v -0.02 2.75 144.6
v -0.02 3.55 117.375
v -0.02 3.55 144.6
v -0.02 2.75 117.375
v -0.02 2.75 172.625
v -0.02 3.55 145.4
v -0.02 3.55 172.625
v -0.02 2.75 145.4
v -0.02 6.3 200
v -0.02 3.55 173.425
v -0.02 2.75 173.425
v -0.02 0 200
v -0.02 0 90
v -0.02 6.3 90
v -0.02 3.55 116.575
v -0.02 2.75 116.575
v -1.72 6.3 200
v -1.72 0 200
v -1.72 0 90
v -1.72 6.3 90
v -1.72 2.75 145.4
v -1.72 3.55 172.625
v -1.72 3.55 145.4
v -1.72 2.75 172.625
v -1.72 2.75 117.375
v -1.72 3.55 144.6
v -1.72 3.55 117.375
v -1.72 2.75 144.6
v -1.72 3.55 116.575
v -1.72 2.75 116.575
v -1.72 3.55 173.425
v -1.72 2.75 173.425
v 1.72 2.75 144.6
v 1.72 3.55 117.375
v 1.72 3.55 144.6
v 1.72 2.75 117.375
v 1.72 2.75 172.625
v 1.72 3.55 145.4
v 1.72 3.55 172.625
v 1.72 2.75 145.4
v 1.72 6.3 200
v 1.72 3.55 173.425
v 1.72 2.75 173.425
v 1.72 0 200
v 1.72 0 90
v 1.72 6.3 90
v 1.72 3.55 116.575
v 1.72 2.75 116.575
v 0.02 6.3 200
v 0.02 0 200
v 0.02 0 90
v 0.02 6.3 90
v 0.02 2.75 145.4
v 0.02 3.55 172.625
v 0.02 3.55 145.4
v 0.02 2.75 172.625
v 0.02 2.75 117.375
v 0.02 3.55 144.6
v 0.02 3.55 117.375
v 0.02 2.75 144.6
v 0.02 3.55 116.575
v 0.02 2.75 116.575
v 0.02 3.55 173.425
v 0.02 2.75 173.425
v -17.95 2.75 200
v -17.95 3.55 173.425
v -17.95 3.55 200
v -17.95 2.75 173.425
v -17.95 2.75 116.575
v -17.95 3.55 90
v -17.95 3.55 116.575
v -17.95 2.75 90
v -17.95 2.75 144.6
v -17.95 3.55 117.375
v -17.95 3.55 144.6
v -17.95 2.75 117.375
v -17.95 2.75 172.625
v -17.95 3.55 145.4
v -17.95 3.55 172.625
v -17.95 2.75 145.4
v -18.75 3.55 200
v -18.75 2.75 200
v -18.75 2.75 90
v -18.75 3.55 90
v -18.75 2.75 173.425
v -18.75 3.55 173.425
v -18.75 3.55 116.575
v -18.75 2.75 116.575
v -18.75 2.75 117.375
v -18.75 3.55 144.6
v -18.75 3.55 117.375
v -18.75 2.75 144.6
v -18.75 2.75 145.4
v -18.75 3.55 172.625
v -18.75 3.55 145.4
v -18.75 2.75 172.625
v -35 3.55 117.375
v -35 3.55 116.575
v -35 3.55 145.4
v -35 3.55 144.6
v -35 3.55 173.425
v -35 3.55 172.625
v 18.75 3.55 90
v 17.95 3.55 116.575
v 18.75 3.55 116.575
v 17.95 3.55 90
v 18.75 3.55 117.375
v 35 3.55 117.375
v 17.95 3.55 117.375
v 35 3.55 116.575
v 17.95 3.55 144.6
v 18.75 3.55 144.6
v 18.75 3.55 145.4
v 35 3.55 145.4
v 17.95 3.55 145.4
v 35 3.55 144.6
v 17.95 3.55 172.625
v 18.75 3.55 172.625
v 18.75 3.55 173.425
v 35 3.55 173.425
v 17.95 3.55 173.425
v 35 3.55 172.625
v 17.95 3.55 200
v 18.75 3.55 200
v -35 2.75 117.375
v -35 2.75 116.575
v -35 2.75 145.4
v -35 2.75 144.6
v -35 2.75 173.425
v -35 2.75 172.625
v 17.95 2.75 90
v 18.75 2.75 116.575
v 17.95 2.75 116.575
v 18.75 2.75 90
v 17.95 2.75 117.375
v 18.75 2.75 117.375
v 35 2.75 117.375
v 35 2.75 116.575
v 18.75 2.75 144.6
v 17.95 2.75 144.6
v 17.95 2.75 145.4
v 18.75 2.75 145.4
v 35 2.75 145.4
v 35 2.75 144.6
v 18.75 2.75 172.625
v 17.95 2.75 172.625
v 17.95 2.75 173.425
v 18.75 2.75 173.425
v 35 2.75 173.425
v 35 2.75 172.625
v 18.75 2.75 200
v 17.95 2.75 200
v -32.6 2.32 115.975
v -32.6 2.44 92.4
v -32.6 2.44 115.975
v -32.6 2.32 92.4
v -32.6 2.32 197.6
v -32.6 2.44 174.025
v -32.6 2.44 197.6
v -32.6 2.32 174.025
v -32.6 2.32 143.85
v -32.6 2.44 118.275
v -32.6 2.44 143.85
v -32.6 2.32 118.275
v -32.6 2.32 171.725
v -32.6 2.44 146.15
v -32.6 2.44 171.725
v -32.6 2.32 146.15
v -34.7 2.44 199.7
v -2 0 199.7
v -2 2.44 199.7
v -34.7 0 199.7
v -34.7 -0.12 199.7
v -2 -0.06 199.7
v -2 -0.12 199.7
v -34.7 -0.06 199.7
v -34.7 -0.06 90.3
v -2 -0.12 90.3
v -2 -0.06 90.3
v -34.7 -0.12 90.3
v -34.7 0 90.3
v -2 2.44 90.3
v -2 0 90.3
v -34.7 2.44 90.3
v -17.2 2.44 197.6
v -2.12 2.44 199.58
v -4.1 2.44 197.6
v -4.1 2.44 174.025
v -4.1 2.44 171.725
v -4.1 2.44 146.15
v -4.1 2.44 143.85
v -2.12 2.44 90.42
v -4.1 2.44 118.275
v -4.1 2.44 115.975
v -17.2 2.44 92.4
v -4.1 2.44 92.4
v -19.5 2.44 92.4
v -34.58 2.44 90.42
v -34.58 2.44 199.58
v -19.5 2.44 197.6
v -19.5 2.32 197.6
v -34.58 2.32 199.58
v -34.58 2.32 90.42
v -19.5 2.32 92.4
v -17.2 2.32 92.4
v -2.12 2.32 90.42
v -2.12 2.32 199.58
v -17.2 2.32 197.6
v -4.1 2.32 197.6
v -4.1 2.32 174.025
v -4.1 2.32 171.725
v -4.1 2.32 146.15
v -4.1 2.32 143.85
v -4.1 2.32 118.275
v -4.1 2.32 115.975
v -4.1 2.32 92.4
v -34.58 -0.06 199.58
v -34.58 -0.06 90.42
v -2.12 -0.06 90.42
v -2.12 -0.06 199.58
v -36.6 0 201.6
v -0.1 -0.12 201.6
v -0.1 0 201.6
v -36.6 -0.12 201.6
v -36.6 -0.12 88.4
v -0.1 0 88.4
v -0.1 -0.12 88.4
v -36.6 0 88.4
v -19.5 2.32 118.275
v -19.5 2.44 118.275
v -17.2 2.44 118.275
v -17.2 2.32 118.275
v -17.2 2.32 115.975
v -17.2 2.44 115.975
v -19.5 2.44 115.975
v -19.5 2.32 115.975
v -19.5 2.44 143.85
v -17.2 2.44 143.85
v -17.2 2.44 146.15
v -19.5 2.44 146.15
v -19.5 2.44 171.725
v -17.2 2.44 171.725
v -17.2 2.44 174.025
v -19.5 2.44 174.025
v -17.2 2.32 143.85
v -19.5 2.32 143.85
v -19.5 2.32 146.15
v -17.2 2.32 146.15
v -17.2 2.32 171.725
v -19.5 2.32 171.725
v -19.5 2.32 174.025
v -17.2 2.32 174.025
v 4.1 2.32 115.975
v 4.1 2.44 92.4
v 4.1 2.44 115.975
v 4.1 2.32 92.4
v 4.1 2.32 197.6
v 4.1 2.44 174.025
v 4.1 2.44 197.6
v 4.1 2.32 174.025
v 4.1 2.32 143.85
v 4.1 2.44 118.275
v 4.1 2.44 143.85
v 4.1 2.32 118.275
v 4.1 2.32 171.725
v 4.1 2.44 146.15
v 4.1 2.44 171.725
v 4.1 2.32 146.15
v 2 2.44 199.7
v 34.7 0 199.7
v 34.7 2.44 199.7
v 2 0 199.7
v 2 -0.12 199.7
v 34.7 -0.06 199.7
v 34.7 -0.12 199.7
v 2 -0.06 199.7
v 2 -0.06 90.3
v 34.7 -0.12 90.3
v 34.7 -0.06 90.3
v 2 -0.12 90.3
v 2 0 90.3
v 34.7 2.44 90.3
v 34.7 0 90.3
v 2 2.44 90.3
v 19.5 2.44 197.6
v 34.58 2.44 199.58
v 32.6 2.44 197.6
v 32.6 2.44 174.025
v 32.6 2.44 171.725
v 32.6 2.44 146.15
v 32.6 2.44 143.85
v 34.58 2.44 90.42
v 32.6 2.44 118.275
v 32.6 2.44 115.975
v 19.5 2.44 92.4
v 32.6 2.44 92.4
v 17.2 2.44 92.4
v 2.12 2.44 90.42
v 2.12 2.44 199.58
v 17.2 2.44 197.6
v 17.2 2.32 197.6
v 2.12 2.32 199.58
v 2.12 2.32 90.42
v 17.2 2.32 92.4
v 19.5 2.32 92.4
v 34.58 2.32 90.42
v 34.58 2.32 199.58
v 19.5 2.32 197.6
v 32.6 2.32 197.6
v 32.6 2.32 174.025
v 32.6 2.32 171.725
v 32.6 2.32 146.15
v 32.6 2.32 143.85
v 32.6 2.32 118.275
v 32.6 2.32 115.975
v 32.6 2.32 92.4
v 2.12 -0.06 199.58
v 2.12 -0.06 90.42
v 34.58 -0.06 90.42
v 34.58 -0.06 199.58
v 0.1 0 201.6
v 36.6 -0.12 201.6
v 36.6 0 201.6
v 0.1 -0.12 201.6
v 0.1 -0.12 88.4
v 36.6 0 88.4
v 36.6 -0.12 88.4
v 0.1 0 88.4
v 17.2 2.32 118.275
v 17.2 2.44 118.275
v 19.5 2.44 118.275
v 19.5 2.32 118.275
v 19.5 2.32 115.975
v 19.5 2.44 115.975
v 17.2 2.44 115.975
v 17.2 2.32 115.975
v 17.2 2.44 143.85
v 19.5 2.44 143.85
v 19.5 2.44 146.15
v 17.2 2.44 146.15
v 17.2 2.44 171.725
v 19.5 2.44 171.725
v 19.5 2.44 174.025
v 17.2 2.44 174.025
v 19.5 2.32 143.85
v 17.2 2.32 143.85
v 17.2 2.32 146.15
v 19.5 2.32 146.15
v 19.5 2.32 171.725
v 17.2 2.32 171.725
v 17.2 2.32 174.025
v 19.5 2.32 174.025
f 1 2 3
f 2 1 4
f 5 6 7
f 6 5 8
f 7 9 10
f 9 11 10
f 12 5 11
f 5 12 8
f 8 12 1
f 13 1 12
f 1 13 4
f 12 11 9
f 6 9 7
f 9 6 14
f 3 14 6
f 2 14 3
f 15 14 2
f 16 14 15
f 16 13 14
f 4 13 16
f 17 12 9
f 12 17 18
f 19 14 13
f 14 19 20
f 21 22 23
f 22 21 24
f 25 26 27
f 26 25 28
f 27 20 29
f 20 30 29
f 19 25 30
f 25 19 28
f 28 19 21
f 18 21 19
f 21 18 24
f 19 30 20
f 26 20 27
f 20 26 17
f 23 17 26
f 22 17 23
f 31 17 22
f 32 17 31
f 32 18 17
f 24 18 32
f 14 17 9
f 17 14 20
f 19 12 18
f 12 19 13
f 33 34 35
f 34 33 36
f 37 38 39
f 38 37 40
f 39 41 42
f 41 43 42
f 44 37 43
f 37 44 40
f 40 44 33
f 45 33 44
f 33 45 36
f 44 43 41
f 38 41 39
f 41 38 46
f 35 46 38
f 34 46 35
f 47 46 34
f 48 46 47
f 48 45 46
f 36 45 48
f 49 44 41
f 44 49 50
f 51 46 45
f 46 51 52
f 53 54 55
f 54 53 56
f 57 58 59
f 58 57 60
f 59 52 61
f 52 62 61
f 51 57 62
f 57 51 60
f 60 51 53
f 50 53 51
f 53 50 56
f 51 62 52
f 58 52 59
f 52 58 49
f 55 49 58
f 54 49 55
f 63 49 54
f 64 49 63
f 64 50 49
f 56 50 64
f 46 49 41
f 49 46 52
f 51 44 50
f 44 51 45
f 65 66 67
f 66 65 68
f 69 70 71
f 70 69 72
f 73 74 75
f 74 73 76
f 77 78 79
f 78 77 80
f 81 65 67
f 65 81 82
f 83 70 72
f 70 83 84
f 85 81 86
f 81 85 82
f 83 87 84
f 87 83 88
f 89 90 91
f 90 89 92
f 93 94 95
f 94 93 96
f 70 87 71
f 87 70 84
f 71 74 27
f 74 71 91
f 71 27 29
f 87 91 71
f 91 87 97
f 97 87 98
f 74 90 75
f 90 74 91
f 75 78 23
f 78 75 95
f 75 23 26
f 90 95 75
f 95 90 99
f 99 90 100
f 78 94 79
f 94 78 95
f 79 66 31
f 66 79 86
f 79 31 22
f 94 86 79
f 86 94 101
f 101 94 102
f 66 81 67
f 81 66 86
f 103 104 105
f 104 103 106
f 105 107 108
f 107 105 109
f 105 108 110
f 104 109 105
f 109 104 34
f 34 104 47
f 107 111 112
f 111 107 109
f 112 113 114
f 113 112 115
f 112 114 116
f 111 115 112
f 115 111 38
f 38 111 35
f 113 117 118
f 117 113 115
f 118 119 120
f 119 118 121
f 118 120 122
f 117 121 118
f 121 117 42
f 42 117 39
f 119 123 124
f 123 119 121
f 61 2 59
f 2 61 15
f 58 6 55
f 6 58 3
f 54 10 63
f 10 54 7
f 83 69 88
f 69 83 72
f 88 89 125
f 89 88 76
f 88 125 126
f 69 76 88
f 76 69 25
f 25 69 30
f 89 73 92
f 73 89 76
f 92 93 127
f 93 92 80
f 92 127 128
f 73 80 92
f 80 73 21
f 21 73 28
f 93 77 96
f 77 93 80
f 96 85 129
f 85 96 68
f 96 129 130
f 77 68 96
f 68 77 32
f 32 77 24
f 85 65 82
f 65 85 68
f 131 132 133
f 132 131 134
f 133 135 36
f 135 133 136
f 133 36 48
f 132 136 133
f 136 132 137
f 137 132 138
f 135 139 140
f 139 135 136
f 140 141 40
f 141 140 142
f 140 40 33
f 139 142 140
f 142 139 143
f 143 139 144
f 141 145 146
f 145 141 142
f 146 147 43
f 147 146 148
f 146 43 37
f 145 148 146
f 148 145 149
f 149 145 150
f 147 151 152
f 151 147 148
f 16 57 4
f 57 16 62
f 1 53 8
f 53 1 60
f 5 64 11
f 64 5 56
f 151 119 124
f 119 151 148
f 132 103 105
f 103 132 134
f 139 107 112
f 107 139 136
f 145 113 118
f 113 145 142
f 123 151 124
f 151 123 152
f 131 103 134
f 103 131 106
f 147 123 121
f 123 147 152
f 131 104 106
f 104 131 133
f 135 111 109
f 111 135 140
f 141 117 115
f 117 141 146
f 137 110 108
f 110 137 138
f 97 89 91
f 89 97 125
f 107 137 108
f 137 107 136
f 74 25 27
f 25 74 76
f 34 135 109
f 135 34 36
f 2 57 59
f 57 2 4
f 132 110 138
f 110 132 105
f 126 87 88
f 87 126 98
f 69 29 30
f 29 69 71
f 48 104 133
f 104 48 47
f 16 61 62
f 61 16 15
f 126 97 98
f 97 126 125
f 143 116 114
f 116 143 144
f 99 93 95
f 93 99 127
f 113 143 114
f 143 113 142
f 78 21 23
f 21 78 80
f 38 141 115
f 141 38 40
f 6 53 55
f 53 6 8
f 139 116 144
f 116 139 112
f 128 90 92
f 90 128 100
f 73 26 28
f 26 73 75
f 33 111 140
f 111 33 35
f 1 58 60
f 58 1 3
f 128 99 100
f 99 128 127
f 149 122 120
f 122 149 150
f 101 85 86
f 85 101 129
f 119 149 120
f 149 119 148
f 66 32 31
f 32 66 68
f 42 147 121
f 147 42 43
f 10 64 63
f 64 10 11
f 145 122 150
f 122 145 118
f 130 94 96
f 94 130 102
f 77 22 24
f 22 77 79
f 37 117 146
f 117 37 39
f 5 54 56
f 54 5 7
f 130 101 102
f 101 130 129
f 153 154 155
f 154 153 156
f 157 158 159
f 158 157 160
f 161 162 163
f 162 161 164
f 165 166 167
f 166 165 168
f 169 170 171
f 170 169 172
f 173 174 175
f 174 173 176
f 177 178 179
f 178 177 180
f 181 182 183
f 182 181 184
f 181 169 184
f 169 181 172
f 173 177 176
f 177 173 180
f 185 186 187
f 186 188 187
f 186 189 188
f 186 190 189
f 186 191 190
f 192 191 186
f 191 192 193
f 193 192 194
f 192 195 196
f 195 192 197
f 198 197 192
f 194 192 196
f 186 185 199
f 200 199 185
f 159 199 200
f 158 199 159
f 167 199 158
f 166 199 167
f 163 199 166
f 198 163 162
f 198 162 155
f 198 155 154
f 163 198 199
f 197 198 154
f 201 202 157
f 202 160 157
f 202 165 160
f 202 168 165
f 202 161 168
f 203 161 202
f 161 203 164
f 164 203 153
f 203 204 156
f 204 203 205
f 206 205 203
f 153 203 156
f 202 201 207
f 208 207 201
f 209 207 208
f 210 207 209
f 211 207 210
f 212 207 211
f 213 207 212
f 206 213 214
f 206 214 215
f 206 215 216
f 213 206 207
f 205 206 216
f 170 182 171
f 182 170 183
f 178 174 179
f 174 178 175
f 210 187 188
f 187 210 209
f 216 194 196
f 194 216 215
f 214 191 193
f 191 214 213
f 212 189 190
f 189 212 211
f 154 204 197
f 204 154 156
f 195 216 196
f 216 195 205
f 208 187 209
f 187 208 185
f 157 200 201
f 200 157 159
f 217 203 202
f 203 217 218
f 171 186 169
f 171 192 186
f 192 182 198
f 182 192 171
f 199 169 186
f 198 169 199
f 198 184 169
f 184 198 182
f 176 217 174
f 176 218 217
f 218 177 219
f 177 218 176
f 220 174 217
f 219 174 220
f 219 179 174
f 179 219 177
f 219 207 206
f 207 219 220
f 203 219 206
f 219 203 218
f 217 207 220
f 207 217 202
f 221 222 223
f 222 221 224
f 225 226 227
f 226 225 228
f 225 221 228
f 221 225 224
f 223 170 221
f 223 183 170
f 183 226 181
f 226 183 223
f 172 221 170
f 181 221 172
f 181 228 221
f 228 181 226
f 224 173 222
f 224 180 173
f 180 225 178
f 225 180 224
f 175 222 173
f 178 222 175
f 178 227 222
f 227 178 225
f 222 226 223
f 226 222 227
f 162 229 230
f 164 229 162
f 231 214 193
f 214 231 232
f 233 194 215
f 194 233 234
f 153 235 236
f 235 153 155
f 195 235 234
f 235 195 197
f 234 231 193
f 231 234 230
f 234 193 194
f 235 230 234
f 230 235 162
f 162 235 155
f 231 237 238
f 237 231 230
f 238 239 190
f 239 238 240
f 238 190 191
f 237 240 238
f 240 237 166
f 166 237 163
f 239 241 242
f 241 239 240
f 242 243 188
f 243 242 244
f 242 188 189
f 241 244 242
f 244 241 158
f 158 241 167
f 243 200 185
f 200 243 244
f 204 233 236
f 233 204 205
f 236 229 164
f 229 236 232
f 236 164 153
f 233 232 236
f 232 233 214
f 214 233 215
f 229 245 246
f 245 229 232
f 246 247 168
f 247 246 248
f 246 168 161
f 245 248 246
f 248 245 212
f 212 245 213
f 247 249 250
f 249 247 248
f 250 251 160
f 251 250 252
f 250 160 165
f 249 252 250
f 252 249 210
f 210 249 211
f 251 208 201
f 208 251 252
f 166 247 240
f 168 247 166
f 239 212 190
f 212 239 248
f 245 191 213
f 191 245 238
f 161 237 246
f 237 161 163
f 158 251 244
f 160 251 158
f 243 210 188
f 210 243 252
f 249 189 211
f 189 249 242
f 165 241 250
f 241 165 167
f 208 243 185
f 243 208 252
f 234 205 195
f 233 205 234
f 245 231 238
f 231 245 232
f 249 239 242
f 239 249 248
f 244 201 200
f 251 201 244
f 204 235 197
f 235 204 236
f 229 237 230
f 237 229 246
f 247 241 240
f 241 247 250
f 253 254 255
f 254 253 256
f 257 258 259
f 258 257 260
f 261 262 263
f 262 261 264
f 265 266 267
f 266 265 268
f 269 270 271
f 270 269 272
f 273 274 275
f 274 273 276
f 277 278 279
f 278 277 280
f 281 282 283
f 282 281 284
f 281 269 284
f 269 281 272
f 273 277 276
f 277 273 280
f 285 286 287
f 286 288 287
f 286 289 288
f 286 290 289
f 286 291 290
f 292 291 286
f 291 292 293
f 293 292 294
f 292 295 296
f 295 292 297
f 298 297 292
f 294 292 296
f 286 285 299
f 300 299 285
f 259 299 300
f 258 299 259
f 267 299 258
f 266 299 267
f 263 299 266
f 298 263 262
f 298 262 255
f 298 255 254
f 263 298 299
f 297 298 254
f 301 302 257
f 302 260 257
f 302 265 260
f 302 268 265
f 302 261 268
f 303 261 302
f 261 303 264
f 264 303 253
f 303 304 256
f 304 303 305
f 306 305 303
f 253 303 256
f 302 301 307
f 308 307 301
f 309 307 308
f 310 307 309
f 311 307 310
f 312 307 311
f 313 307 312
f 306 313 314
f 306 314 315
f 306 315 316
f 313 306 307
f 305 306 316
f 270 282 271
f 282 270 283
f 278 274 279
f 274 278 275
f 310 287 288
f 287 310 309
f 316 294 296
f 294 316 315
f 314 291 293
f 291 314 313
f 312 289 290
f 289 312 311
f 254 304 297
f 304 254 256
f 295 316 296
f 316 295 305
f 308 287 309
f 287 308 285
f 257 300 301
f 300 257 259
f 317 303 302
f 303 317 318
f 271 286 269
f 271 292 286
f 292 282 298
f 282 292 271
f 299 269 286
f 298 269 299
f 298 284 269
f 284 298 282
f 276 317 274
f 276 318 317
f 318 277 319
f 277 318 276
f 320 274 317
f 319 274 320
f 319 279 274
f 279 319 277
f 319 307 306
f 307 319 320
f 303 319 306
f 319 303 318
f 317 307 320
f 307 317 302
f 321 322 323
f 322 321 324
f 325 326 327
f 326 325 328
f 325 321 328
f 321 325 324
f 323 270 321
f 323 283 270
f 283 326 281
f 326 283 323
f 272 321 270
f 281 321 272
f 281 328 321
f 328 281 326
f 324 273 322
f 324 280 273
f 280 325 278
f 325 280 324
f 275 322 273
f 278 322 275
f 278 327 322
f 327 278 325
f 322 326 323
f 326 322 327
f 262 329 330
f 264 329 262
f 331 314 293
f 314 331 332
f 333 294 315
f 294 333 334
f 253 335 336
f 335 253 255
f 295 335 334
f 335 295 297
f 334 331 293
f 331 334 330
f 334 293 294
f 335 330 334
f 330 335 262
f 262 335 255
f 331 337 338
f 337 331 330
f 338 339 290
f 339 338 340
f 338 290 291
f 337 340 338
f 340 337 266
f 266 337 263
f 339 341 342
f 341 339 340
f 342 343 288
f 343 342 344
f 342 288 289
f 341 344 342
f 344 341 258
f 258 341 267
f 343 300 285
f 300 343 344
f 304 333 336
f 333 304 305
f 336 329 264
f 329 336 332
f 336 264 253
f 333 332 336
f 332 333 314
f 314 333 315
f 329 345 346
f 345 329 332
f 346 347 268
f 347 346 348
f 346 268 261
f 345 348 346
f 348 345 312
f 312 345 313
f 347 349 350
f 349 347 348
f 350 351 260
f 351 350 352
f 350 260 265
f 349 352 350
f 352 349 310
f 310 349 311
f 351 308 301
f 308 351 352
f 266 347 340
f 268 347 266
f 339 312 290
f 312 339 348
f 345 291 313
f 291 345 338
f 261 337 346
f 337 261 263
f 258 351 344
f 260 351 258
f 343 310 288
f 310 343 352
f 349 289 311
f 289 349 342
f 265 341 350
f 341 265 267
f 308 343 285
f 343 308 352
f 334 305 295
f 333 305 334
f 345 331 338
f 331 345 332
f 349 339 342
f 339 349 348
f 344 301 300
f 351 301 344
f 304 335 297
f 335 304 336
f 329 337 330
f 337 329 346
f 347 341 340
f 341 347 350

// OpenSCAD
// If high_windows is false, the ready Thailand metal frame
// size is used. If windows are made by ourselves, the
// high_windows can be set to true to get bigger windows.
high_windows = false;

std_window_w = high_windows ? 75 : 70;
std_window_h = high_windows ? 135 : 110;
std_window_hatches = 2;
std_window_pos = high_windows ? 80 : 90;
std_nro_vertical_squares = 4;

wide_window_w = 2 * std_window_w;
wide_window_h = std_window_h;
wide_window_hatches = 4;

small_window_w = high_windows ? 60 : 50;
small_window_h = small_window_w;
small_window_hatches = 2;
small_window_pos = std_window_pos + std_window_h - small_window_h;
small_nro_vertical_squares = 2;

small_bar_d = 0.8;
separator_bar_w = 1.7;
separator_bar_d = 6.3;

glass_frame_w = 2.1;
glass_divider_w = 2.3;
glass_frame_t = 0.12;
glass_frame_d = 2.5;
glass_frame_flap_w = 1.9;


allowance = 0.3;
hinge_dx = 1;
hinge_dy = 3;
window_frame_color1 = [0.4, 0.2, 0.2, 1.0];
window_frame_color2 = [0.5, 0.3, 0.3, 1.0];
window_frame_color3 = [0.3, 0.4, 0.3, 1.0];

module std_window(wall_thickness=15, open_angle=0, window_pos = std_window_pos)
{
    translate([0,0,window_pos])
    window(wall_thickness, open_angle, 
        std_window_w, std_window_h, 
        std_window_hatches, 
        std_nro_vertical_squares);
}

module std_window_hole(wall_thickness=15, window_pos = std_window_pos)
{
    translate([0,wall_thickness/2,window_pos+std_window_h/2])
    color("white")
    cube([std_window_w, wall_thickness+1.0, std_window_h],center=true);
}

module wide_window(wall_thickness=15, open_angle=0, window_pos = std_window_pos)
{
    translate([0,0,window_pos])
    window(wall_thickness, open_angle, 
        wide_window_w, wide_window_h, 
        wide_window_hatches, 
        std_nro_vertical_squares);
}

module wide_window_hole(wall_thickness=15, window_pos = std_window_pos)
{
    translate([0,wall_thickness/2,window_pos+wide_window_h/2])
    color("white")
    cube([wide_window_w, wall_thickness+1.0, wide_window_h],center=true);
}

module small_window(wall_thickness=15, open_angle=0, window_pos = small_window_pos)
{
    translate([0,0,window_pos])
    window(wall_thickness, open_angle, 
        small_window_w, small_window_h, 
        small_window_hatches, small_nro_vertical_squares);
}

module small_window_hole(wall_thickness=15, window_pos = small_window_pos)
{
    translate([0,wall_thickness/2,window_pos+small_window_h/2])
    color("white")
    cube([small_window_w, wall_thickness+1.0, small_window_h],center=true);
}

module window(wall_thickness=15, open_angle=0, width=std_window_w, height=std_window_h, nro_openings = std_window_hatches,
    nro_vertical_squares=std_nro_vertical_squares) 
{
    fixedgrid(width, height, nro_openings, nro_vertical_squares); 
    
    hatch_w = (width - (2*nro_openings-2)*separator_bar_w)/nro_openings - 2 * allowance;
    hatch_h = height - 2 * allowance; 
    step_x = (width+2*separator_bar_w) / nro_openings;
    for (i = [0:nro_openings-1])
    {
        x = step_x * (i - nro_openings/2 + 0.5);

        translate([x, 0, height/2]) 
        windowhatch(hatch_w, hatch_h, open_angle, i,
            nro_vertical_squares); 
    }
}

module fixedgrid(width, height, nro_openings, nro_vertical_squares) 
{
    step_x = (width+2*separator_bar_w) / nro_openings;
    for (i = [nro_openings/-2+1:nro_openings/2-1])
    {
        x = step_x * i;
        color(window_frame_color1) 
        translate([x - separator_bar_w/2-0.02, 
            separator_bar_d/2, height/2]) 
        cube([separator_bar_w, separator_bar_d, height],
                center=true);
            
        color(window_frame_color2) 
        translate([x + separator_bar_w/2+0.02, 
            separator_bar_d/2, height/2]) 
        cube([separator_bar_w, separator_bar_d, height],
            center=true);
   }
   
   for (i = [0:nro_openings-1])
   {
       x = step_x * (i - nro_openings/2 + 0.5);

       color(window_frame_color2) 
       translate([x, separator_bar_d/2, height/2]) 
       cube([small_bar_d, small_bar_d, height],
           center=true);
   }
   
   step_y = (height+glass_frame_w) / nro_vertical_squares;
   for (i = [nro_vertical_squares/-2+1:nro_vertical_squares/2-1])
   {
       y = step_y * i + height/2;

       color(window_frame_color1) 
       translate([0, separator_bar_d/2, y]) 
       cube([width, small_bar_d, small_bar_d],
           center=true);
   }   
}

module windowhatch(width=70, height=110, open_angle=0, step=0, nro_vertical_squares=std_nro_vertical_squares) 
{
    dx = step%2 == 0 ? width/2 + hinge_dx : -width/2 - hinge_dx;
    dy = hinge_dy;
    translate([-dx, -dy, 0])
    rotate([0,0, step%2 == 0 ? -open_angle : open_angle])
    translate([dx, dy, 0])
    {
        color(window_frame_color2)
        translate([0, (glass_frame_d-glass_frame_t), 0])
        genericframe(width, height, glass_frame_w, glass_frame_t);
        
        color(window_frame_color3)
        translate([0, (glass_frame_d-glass_frame_t)/2, 0])
        genericframe(width, height, glass_frame_t, glass_frame_d);

        color(window_frame_color2)
        translate([0, glass_frame_t/-2, 0])
        genericframe(width+2*glass_frame_flap_w, height+2*glass_frame_flap_w, glass_frame_flap_w, glass_frame_t);
        
        color(window_frame_color1) 
        translate([0, (glass_frame_d-glass_frame_t), 0])
        cube([glass_divider_w, glass_frame_t, 
            height-2*glass_frame_w], center=true);
        
        step_y = (height+glass_frame_w) / nro_vertical_squares;
        for (i = [nro_vertical_squares/-2+1:nro_vertical_squares/2-1])
        {
           y = step_y * i;

           color(window_frame_color1) 
           translate([0, (glass_frame_d-glass_frame_t), y]) 
           cube([width-2*glass_frame_w, glass_frame_t, glass_divider_w],
               center=true);
       }   
   }
} 


module genericframe(width=70, height=110, profile_width = 5, profile_depth = 8) 
{
    translate([-(width - profile_width)/2, 0, 0]) 
    cube([profile_width,profile_depth, height], center=true);
    
    translate([(width - profile_width)/2, 0, 0]) 
    cube([profile_width,profile_depth, height], center=true);

    translate([0, 0, -(height - profile_width)/2]) 
    cube([width, profile_depth, profile_width], center=true);

    translate([0, 0, (height - profile_width)/2]) 
    cube([width, profile_depth, profile_width], center=true);
}    

// For testing
std_window(open_angle=$t*1790);
